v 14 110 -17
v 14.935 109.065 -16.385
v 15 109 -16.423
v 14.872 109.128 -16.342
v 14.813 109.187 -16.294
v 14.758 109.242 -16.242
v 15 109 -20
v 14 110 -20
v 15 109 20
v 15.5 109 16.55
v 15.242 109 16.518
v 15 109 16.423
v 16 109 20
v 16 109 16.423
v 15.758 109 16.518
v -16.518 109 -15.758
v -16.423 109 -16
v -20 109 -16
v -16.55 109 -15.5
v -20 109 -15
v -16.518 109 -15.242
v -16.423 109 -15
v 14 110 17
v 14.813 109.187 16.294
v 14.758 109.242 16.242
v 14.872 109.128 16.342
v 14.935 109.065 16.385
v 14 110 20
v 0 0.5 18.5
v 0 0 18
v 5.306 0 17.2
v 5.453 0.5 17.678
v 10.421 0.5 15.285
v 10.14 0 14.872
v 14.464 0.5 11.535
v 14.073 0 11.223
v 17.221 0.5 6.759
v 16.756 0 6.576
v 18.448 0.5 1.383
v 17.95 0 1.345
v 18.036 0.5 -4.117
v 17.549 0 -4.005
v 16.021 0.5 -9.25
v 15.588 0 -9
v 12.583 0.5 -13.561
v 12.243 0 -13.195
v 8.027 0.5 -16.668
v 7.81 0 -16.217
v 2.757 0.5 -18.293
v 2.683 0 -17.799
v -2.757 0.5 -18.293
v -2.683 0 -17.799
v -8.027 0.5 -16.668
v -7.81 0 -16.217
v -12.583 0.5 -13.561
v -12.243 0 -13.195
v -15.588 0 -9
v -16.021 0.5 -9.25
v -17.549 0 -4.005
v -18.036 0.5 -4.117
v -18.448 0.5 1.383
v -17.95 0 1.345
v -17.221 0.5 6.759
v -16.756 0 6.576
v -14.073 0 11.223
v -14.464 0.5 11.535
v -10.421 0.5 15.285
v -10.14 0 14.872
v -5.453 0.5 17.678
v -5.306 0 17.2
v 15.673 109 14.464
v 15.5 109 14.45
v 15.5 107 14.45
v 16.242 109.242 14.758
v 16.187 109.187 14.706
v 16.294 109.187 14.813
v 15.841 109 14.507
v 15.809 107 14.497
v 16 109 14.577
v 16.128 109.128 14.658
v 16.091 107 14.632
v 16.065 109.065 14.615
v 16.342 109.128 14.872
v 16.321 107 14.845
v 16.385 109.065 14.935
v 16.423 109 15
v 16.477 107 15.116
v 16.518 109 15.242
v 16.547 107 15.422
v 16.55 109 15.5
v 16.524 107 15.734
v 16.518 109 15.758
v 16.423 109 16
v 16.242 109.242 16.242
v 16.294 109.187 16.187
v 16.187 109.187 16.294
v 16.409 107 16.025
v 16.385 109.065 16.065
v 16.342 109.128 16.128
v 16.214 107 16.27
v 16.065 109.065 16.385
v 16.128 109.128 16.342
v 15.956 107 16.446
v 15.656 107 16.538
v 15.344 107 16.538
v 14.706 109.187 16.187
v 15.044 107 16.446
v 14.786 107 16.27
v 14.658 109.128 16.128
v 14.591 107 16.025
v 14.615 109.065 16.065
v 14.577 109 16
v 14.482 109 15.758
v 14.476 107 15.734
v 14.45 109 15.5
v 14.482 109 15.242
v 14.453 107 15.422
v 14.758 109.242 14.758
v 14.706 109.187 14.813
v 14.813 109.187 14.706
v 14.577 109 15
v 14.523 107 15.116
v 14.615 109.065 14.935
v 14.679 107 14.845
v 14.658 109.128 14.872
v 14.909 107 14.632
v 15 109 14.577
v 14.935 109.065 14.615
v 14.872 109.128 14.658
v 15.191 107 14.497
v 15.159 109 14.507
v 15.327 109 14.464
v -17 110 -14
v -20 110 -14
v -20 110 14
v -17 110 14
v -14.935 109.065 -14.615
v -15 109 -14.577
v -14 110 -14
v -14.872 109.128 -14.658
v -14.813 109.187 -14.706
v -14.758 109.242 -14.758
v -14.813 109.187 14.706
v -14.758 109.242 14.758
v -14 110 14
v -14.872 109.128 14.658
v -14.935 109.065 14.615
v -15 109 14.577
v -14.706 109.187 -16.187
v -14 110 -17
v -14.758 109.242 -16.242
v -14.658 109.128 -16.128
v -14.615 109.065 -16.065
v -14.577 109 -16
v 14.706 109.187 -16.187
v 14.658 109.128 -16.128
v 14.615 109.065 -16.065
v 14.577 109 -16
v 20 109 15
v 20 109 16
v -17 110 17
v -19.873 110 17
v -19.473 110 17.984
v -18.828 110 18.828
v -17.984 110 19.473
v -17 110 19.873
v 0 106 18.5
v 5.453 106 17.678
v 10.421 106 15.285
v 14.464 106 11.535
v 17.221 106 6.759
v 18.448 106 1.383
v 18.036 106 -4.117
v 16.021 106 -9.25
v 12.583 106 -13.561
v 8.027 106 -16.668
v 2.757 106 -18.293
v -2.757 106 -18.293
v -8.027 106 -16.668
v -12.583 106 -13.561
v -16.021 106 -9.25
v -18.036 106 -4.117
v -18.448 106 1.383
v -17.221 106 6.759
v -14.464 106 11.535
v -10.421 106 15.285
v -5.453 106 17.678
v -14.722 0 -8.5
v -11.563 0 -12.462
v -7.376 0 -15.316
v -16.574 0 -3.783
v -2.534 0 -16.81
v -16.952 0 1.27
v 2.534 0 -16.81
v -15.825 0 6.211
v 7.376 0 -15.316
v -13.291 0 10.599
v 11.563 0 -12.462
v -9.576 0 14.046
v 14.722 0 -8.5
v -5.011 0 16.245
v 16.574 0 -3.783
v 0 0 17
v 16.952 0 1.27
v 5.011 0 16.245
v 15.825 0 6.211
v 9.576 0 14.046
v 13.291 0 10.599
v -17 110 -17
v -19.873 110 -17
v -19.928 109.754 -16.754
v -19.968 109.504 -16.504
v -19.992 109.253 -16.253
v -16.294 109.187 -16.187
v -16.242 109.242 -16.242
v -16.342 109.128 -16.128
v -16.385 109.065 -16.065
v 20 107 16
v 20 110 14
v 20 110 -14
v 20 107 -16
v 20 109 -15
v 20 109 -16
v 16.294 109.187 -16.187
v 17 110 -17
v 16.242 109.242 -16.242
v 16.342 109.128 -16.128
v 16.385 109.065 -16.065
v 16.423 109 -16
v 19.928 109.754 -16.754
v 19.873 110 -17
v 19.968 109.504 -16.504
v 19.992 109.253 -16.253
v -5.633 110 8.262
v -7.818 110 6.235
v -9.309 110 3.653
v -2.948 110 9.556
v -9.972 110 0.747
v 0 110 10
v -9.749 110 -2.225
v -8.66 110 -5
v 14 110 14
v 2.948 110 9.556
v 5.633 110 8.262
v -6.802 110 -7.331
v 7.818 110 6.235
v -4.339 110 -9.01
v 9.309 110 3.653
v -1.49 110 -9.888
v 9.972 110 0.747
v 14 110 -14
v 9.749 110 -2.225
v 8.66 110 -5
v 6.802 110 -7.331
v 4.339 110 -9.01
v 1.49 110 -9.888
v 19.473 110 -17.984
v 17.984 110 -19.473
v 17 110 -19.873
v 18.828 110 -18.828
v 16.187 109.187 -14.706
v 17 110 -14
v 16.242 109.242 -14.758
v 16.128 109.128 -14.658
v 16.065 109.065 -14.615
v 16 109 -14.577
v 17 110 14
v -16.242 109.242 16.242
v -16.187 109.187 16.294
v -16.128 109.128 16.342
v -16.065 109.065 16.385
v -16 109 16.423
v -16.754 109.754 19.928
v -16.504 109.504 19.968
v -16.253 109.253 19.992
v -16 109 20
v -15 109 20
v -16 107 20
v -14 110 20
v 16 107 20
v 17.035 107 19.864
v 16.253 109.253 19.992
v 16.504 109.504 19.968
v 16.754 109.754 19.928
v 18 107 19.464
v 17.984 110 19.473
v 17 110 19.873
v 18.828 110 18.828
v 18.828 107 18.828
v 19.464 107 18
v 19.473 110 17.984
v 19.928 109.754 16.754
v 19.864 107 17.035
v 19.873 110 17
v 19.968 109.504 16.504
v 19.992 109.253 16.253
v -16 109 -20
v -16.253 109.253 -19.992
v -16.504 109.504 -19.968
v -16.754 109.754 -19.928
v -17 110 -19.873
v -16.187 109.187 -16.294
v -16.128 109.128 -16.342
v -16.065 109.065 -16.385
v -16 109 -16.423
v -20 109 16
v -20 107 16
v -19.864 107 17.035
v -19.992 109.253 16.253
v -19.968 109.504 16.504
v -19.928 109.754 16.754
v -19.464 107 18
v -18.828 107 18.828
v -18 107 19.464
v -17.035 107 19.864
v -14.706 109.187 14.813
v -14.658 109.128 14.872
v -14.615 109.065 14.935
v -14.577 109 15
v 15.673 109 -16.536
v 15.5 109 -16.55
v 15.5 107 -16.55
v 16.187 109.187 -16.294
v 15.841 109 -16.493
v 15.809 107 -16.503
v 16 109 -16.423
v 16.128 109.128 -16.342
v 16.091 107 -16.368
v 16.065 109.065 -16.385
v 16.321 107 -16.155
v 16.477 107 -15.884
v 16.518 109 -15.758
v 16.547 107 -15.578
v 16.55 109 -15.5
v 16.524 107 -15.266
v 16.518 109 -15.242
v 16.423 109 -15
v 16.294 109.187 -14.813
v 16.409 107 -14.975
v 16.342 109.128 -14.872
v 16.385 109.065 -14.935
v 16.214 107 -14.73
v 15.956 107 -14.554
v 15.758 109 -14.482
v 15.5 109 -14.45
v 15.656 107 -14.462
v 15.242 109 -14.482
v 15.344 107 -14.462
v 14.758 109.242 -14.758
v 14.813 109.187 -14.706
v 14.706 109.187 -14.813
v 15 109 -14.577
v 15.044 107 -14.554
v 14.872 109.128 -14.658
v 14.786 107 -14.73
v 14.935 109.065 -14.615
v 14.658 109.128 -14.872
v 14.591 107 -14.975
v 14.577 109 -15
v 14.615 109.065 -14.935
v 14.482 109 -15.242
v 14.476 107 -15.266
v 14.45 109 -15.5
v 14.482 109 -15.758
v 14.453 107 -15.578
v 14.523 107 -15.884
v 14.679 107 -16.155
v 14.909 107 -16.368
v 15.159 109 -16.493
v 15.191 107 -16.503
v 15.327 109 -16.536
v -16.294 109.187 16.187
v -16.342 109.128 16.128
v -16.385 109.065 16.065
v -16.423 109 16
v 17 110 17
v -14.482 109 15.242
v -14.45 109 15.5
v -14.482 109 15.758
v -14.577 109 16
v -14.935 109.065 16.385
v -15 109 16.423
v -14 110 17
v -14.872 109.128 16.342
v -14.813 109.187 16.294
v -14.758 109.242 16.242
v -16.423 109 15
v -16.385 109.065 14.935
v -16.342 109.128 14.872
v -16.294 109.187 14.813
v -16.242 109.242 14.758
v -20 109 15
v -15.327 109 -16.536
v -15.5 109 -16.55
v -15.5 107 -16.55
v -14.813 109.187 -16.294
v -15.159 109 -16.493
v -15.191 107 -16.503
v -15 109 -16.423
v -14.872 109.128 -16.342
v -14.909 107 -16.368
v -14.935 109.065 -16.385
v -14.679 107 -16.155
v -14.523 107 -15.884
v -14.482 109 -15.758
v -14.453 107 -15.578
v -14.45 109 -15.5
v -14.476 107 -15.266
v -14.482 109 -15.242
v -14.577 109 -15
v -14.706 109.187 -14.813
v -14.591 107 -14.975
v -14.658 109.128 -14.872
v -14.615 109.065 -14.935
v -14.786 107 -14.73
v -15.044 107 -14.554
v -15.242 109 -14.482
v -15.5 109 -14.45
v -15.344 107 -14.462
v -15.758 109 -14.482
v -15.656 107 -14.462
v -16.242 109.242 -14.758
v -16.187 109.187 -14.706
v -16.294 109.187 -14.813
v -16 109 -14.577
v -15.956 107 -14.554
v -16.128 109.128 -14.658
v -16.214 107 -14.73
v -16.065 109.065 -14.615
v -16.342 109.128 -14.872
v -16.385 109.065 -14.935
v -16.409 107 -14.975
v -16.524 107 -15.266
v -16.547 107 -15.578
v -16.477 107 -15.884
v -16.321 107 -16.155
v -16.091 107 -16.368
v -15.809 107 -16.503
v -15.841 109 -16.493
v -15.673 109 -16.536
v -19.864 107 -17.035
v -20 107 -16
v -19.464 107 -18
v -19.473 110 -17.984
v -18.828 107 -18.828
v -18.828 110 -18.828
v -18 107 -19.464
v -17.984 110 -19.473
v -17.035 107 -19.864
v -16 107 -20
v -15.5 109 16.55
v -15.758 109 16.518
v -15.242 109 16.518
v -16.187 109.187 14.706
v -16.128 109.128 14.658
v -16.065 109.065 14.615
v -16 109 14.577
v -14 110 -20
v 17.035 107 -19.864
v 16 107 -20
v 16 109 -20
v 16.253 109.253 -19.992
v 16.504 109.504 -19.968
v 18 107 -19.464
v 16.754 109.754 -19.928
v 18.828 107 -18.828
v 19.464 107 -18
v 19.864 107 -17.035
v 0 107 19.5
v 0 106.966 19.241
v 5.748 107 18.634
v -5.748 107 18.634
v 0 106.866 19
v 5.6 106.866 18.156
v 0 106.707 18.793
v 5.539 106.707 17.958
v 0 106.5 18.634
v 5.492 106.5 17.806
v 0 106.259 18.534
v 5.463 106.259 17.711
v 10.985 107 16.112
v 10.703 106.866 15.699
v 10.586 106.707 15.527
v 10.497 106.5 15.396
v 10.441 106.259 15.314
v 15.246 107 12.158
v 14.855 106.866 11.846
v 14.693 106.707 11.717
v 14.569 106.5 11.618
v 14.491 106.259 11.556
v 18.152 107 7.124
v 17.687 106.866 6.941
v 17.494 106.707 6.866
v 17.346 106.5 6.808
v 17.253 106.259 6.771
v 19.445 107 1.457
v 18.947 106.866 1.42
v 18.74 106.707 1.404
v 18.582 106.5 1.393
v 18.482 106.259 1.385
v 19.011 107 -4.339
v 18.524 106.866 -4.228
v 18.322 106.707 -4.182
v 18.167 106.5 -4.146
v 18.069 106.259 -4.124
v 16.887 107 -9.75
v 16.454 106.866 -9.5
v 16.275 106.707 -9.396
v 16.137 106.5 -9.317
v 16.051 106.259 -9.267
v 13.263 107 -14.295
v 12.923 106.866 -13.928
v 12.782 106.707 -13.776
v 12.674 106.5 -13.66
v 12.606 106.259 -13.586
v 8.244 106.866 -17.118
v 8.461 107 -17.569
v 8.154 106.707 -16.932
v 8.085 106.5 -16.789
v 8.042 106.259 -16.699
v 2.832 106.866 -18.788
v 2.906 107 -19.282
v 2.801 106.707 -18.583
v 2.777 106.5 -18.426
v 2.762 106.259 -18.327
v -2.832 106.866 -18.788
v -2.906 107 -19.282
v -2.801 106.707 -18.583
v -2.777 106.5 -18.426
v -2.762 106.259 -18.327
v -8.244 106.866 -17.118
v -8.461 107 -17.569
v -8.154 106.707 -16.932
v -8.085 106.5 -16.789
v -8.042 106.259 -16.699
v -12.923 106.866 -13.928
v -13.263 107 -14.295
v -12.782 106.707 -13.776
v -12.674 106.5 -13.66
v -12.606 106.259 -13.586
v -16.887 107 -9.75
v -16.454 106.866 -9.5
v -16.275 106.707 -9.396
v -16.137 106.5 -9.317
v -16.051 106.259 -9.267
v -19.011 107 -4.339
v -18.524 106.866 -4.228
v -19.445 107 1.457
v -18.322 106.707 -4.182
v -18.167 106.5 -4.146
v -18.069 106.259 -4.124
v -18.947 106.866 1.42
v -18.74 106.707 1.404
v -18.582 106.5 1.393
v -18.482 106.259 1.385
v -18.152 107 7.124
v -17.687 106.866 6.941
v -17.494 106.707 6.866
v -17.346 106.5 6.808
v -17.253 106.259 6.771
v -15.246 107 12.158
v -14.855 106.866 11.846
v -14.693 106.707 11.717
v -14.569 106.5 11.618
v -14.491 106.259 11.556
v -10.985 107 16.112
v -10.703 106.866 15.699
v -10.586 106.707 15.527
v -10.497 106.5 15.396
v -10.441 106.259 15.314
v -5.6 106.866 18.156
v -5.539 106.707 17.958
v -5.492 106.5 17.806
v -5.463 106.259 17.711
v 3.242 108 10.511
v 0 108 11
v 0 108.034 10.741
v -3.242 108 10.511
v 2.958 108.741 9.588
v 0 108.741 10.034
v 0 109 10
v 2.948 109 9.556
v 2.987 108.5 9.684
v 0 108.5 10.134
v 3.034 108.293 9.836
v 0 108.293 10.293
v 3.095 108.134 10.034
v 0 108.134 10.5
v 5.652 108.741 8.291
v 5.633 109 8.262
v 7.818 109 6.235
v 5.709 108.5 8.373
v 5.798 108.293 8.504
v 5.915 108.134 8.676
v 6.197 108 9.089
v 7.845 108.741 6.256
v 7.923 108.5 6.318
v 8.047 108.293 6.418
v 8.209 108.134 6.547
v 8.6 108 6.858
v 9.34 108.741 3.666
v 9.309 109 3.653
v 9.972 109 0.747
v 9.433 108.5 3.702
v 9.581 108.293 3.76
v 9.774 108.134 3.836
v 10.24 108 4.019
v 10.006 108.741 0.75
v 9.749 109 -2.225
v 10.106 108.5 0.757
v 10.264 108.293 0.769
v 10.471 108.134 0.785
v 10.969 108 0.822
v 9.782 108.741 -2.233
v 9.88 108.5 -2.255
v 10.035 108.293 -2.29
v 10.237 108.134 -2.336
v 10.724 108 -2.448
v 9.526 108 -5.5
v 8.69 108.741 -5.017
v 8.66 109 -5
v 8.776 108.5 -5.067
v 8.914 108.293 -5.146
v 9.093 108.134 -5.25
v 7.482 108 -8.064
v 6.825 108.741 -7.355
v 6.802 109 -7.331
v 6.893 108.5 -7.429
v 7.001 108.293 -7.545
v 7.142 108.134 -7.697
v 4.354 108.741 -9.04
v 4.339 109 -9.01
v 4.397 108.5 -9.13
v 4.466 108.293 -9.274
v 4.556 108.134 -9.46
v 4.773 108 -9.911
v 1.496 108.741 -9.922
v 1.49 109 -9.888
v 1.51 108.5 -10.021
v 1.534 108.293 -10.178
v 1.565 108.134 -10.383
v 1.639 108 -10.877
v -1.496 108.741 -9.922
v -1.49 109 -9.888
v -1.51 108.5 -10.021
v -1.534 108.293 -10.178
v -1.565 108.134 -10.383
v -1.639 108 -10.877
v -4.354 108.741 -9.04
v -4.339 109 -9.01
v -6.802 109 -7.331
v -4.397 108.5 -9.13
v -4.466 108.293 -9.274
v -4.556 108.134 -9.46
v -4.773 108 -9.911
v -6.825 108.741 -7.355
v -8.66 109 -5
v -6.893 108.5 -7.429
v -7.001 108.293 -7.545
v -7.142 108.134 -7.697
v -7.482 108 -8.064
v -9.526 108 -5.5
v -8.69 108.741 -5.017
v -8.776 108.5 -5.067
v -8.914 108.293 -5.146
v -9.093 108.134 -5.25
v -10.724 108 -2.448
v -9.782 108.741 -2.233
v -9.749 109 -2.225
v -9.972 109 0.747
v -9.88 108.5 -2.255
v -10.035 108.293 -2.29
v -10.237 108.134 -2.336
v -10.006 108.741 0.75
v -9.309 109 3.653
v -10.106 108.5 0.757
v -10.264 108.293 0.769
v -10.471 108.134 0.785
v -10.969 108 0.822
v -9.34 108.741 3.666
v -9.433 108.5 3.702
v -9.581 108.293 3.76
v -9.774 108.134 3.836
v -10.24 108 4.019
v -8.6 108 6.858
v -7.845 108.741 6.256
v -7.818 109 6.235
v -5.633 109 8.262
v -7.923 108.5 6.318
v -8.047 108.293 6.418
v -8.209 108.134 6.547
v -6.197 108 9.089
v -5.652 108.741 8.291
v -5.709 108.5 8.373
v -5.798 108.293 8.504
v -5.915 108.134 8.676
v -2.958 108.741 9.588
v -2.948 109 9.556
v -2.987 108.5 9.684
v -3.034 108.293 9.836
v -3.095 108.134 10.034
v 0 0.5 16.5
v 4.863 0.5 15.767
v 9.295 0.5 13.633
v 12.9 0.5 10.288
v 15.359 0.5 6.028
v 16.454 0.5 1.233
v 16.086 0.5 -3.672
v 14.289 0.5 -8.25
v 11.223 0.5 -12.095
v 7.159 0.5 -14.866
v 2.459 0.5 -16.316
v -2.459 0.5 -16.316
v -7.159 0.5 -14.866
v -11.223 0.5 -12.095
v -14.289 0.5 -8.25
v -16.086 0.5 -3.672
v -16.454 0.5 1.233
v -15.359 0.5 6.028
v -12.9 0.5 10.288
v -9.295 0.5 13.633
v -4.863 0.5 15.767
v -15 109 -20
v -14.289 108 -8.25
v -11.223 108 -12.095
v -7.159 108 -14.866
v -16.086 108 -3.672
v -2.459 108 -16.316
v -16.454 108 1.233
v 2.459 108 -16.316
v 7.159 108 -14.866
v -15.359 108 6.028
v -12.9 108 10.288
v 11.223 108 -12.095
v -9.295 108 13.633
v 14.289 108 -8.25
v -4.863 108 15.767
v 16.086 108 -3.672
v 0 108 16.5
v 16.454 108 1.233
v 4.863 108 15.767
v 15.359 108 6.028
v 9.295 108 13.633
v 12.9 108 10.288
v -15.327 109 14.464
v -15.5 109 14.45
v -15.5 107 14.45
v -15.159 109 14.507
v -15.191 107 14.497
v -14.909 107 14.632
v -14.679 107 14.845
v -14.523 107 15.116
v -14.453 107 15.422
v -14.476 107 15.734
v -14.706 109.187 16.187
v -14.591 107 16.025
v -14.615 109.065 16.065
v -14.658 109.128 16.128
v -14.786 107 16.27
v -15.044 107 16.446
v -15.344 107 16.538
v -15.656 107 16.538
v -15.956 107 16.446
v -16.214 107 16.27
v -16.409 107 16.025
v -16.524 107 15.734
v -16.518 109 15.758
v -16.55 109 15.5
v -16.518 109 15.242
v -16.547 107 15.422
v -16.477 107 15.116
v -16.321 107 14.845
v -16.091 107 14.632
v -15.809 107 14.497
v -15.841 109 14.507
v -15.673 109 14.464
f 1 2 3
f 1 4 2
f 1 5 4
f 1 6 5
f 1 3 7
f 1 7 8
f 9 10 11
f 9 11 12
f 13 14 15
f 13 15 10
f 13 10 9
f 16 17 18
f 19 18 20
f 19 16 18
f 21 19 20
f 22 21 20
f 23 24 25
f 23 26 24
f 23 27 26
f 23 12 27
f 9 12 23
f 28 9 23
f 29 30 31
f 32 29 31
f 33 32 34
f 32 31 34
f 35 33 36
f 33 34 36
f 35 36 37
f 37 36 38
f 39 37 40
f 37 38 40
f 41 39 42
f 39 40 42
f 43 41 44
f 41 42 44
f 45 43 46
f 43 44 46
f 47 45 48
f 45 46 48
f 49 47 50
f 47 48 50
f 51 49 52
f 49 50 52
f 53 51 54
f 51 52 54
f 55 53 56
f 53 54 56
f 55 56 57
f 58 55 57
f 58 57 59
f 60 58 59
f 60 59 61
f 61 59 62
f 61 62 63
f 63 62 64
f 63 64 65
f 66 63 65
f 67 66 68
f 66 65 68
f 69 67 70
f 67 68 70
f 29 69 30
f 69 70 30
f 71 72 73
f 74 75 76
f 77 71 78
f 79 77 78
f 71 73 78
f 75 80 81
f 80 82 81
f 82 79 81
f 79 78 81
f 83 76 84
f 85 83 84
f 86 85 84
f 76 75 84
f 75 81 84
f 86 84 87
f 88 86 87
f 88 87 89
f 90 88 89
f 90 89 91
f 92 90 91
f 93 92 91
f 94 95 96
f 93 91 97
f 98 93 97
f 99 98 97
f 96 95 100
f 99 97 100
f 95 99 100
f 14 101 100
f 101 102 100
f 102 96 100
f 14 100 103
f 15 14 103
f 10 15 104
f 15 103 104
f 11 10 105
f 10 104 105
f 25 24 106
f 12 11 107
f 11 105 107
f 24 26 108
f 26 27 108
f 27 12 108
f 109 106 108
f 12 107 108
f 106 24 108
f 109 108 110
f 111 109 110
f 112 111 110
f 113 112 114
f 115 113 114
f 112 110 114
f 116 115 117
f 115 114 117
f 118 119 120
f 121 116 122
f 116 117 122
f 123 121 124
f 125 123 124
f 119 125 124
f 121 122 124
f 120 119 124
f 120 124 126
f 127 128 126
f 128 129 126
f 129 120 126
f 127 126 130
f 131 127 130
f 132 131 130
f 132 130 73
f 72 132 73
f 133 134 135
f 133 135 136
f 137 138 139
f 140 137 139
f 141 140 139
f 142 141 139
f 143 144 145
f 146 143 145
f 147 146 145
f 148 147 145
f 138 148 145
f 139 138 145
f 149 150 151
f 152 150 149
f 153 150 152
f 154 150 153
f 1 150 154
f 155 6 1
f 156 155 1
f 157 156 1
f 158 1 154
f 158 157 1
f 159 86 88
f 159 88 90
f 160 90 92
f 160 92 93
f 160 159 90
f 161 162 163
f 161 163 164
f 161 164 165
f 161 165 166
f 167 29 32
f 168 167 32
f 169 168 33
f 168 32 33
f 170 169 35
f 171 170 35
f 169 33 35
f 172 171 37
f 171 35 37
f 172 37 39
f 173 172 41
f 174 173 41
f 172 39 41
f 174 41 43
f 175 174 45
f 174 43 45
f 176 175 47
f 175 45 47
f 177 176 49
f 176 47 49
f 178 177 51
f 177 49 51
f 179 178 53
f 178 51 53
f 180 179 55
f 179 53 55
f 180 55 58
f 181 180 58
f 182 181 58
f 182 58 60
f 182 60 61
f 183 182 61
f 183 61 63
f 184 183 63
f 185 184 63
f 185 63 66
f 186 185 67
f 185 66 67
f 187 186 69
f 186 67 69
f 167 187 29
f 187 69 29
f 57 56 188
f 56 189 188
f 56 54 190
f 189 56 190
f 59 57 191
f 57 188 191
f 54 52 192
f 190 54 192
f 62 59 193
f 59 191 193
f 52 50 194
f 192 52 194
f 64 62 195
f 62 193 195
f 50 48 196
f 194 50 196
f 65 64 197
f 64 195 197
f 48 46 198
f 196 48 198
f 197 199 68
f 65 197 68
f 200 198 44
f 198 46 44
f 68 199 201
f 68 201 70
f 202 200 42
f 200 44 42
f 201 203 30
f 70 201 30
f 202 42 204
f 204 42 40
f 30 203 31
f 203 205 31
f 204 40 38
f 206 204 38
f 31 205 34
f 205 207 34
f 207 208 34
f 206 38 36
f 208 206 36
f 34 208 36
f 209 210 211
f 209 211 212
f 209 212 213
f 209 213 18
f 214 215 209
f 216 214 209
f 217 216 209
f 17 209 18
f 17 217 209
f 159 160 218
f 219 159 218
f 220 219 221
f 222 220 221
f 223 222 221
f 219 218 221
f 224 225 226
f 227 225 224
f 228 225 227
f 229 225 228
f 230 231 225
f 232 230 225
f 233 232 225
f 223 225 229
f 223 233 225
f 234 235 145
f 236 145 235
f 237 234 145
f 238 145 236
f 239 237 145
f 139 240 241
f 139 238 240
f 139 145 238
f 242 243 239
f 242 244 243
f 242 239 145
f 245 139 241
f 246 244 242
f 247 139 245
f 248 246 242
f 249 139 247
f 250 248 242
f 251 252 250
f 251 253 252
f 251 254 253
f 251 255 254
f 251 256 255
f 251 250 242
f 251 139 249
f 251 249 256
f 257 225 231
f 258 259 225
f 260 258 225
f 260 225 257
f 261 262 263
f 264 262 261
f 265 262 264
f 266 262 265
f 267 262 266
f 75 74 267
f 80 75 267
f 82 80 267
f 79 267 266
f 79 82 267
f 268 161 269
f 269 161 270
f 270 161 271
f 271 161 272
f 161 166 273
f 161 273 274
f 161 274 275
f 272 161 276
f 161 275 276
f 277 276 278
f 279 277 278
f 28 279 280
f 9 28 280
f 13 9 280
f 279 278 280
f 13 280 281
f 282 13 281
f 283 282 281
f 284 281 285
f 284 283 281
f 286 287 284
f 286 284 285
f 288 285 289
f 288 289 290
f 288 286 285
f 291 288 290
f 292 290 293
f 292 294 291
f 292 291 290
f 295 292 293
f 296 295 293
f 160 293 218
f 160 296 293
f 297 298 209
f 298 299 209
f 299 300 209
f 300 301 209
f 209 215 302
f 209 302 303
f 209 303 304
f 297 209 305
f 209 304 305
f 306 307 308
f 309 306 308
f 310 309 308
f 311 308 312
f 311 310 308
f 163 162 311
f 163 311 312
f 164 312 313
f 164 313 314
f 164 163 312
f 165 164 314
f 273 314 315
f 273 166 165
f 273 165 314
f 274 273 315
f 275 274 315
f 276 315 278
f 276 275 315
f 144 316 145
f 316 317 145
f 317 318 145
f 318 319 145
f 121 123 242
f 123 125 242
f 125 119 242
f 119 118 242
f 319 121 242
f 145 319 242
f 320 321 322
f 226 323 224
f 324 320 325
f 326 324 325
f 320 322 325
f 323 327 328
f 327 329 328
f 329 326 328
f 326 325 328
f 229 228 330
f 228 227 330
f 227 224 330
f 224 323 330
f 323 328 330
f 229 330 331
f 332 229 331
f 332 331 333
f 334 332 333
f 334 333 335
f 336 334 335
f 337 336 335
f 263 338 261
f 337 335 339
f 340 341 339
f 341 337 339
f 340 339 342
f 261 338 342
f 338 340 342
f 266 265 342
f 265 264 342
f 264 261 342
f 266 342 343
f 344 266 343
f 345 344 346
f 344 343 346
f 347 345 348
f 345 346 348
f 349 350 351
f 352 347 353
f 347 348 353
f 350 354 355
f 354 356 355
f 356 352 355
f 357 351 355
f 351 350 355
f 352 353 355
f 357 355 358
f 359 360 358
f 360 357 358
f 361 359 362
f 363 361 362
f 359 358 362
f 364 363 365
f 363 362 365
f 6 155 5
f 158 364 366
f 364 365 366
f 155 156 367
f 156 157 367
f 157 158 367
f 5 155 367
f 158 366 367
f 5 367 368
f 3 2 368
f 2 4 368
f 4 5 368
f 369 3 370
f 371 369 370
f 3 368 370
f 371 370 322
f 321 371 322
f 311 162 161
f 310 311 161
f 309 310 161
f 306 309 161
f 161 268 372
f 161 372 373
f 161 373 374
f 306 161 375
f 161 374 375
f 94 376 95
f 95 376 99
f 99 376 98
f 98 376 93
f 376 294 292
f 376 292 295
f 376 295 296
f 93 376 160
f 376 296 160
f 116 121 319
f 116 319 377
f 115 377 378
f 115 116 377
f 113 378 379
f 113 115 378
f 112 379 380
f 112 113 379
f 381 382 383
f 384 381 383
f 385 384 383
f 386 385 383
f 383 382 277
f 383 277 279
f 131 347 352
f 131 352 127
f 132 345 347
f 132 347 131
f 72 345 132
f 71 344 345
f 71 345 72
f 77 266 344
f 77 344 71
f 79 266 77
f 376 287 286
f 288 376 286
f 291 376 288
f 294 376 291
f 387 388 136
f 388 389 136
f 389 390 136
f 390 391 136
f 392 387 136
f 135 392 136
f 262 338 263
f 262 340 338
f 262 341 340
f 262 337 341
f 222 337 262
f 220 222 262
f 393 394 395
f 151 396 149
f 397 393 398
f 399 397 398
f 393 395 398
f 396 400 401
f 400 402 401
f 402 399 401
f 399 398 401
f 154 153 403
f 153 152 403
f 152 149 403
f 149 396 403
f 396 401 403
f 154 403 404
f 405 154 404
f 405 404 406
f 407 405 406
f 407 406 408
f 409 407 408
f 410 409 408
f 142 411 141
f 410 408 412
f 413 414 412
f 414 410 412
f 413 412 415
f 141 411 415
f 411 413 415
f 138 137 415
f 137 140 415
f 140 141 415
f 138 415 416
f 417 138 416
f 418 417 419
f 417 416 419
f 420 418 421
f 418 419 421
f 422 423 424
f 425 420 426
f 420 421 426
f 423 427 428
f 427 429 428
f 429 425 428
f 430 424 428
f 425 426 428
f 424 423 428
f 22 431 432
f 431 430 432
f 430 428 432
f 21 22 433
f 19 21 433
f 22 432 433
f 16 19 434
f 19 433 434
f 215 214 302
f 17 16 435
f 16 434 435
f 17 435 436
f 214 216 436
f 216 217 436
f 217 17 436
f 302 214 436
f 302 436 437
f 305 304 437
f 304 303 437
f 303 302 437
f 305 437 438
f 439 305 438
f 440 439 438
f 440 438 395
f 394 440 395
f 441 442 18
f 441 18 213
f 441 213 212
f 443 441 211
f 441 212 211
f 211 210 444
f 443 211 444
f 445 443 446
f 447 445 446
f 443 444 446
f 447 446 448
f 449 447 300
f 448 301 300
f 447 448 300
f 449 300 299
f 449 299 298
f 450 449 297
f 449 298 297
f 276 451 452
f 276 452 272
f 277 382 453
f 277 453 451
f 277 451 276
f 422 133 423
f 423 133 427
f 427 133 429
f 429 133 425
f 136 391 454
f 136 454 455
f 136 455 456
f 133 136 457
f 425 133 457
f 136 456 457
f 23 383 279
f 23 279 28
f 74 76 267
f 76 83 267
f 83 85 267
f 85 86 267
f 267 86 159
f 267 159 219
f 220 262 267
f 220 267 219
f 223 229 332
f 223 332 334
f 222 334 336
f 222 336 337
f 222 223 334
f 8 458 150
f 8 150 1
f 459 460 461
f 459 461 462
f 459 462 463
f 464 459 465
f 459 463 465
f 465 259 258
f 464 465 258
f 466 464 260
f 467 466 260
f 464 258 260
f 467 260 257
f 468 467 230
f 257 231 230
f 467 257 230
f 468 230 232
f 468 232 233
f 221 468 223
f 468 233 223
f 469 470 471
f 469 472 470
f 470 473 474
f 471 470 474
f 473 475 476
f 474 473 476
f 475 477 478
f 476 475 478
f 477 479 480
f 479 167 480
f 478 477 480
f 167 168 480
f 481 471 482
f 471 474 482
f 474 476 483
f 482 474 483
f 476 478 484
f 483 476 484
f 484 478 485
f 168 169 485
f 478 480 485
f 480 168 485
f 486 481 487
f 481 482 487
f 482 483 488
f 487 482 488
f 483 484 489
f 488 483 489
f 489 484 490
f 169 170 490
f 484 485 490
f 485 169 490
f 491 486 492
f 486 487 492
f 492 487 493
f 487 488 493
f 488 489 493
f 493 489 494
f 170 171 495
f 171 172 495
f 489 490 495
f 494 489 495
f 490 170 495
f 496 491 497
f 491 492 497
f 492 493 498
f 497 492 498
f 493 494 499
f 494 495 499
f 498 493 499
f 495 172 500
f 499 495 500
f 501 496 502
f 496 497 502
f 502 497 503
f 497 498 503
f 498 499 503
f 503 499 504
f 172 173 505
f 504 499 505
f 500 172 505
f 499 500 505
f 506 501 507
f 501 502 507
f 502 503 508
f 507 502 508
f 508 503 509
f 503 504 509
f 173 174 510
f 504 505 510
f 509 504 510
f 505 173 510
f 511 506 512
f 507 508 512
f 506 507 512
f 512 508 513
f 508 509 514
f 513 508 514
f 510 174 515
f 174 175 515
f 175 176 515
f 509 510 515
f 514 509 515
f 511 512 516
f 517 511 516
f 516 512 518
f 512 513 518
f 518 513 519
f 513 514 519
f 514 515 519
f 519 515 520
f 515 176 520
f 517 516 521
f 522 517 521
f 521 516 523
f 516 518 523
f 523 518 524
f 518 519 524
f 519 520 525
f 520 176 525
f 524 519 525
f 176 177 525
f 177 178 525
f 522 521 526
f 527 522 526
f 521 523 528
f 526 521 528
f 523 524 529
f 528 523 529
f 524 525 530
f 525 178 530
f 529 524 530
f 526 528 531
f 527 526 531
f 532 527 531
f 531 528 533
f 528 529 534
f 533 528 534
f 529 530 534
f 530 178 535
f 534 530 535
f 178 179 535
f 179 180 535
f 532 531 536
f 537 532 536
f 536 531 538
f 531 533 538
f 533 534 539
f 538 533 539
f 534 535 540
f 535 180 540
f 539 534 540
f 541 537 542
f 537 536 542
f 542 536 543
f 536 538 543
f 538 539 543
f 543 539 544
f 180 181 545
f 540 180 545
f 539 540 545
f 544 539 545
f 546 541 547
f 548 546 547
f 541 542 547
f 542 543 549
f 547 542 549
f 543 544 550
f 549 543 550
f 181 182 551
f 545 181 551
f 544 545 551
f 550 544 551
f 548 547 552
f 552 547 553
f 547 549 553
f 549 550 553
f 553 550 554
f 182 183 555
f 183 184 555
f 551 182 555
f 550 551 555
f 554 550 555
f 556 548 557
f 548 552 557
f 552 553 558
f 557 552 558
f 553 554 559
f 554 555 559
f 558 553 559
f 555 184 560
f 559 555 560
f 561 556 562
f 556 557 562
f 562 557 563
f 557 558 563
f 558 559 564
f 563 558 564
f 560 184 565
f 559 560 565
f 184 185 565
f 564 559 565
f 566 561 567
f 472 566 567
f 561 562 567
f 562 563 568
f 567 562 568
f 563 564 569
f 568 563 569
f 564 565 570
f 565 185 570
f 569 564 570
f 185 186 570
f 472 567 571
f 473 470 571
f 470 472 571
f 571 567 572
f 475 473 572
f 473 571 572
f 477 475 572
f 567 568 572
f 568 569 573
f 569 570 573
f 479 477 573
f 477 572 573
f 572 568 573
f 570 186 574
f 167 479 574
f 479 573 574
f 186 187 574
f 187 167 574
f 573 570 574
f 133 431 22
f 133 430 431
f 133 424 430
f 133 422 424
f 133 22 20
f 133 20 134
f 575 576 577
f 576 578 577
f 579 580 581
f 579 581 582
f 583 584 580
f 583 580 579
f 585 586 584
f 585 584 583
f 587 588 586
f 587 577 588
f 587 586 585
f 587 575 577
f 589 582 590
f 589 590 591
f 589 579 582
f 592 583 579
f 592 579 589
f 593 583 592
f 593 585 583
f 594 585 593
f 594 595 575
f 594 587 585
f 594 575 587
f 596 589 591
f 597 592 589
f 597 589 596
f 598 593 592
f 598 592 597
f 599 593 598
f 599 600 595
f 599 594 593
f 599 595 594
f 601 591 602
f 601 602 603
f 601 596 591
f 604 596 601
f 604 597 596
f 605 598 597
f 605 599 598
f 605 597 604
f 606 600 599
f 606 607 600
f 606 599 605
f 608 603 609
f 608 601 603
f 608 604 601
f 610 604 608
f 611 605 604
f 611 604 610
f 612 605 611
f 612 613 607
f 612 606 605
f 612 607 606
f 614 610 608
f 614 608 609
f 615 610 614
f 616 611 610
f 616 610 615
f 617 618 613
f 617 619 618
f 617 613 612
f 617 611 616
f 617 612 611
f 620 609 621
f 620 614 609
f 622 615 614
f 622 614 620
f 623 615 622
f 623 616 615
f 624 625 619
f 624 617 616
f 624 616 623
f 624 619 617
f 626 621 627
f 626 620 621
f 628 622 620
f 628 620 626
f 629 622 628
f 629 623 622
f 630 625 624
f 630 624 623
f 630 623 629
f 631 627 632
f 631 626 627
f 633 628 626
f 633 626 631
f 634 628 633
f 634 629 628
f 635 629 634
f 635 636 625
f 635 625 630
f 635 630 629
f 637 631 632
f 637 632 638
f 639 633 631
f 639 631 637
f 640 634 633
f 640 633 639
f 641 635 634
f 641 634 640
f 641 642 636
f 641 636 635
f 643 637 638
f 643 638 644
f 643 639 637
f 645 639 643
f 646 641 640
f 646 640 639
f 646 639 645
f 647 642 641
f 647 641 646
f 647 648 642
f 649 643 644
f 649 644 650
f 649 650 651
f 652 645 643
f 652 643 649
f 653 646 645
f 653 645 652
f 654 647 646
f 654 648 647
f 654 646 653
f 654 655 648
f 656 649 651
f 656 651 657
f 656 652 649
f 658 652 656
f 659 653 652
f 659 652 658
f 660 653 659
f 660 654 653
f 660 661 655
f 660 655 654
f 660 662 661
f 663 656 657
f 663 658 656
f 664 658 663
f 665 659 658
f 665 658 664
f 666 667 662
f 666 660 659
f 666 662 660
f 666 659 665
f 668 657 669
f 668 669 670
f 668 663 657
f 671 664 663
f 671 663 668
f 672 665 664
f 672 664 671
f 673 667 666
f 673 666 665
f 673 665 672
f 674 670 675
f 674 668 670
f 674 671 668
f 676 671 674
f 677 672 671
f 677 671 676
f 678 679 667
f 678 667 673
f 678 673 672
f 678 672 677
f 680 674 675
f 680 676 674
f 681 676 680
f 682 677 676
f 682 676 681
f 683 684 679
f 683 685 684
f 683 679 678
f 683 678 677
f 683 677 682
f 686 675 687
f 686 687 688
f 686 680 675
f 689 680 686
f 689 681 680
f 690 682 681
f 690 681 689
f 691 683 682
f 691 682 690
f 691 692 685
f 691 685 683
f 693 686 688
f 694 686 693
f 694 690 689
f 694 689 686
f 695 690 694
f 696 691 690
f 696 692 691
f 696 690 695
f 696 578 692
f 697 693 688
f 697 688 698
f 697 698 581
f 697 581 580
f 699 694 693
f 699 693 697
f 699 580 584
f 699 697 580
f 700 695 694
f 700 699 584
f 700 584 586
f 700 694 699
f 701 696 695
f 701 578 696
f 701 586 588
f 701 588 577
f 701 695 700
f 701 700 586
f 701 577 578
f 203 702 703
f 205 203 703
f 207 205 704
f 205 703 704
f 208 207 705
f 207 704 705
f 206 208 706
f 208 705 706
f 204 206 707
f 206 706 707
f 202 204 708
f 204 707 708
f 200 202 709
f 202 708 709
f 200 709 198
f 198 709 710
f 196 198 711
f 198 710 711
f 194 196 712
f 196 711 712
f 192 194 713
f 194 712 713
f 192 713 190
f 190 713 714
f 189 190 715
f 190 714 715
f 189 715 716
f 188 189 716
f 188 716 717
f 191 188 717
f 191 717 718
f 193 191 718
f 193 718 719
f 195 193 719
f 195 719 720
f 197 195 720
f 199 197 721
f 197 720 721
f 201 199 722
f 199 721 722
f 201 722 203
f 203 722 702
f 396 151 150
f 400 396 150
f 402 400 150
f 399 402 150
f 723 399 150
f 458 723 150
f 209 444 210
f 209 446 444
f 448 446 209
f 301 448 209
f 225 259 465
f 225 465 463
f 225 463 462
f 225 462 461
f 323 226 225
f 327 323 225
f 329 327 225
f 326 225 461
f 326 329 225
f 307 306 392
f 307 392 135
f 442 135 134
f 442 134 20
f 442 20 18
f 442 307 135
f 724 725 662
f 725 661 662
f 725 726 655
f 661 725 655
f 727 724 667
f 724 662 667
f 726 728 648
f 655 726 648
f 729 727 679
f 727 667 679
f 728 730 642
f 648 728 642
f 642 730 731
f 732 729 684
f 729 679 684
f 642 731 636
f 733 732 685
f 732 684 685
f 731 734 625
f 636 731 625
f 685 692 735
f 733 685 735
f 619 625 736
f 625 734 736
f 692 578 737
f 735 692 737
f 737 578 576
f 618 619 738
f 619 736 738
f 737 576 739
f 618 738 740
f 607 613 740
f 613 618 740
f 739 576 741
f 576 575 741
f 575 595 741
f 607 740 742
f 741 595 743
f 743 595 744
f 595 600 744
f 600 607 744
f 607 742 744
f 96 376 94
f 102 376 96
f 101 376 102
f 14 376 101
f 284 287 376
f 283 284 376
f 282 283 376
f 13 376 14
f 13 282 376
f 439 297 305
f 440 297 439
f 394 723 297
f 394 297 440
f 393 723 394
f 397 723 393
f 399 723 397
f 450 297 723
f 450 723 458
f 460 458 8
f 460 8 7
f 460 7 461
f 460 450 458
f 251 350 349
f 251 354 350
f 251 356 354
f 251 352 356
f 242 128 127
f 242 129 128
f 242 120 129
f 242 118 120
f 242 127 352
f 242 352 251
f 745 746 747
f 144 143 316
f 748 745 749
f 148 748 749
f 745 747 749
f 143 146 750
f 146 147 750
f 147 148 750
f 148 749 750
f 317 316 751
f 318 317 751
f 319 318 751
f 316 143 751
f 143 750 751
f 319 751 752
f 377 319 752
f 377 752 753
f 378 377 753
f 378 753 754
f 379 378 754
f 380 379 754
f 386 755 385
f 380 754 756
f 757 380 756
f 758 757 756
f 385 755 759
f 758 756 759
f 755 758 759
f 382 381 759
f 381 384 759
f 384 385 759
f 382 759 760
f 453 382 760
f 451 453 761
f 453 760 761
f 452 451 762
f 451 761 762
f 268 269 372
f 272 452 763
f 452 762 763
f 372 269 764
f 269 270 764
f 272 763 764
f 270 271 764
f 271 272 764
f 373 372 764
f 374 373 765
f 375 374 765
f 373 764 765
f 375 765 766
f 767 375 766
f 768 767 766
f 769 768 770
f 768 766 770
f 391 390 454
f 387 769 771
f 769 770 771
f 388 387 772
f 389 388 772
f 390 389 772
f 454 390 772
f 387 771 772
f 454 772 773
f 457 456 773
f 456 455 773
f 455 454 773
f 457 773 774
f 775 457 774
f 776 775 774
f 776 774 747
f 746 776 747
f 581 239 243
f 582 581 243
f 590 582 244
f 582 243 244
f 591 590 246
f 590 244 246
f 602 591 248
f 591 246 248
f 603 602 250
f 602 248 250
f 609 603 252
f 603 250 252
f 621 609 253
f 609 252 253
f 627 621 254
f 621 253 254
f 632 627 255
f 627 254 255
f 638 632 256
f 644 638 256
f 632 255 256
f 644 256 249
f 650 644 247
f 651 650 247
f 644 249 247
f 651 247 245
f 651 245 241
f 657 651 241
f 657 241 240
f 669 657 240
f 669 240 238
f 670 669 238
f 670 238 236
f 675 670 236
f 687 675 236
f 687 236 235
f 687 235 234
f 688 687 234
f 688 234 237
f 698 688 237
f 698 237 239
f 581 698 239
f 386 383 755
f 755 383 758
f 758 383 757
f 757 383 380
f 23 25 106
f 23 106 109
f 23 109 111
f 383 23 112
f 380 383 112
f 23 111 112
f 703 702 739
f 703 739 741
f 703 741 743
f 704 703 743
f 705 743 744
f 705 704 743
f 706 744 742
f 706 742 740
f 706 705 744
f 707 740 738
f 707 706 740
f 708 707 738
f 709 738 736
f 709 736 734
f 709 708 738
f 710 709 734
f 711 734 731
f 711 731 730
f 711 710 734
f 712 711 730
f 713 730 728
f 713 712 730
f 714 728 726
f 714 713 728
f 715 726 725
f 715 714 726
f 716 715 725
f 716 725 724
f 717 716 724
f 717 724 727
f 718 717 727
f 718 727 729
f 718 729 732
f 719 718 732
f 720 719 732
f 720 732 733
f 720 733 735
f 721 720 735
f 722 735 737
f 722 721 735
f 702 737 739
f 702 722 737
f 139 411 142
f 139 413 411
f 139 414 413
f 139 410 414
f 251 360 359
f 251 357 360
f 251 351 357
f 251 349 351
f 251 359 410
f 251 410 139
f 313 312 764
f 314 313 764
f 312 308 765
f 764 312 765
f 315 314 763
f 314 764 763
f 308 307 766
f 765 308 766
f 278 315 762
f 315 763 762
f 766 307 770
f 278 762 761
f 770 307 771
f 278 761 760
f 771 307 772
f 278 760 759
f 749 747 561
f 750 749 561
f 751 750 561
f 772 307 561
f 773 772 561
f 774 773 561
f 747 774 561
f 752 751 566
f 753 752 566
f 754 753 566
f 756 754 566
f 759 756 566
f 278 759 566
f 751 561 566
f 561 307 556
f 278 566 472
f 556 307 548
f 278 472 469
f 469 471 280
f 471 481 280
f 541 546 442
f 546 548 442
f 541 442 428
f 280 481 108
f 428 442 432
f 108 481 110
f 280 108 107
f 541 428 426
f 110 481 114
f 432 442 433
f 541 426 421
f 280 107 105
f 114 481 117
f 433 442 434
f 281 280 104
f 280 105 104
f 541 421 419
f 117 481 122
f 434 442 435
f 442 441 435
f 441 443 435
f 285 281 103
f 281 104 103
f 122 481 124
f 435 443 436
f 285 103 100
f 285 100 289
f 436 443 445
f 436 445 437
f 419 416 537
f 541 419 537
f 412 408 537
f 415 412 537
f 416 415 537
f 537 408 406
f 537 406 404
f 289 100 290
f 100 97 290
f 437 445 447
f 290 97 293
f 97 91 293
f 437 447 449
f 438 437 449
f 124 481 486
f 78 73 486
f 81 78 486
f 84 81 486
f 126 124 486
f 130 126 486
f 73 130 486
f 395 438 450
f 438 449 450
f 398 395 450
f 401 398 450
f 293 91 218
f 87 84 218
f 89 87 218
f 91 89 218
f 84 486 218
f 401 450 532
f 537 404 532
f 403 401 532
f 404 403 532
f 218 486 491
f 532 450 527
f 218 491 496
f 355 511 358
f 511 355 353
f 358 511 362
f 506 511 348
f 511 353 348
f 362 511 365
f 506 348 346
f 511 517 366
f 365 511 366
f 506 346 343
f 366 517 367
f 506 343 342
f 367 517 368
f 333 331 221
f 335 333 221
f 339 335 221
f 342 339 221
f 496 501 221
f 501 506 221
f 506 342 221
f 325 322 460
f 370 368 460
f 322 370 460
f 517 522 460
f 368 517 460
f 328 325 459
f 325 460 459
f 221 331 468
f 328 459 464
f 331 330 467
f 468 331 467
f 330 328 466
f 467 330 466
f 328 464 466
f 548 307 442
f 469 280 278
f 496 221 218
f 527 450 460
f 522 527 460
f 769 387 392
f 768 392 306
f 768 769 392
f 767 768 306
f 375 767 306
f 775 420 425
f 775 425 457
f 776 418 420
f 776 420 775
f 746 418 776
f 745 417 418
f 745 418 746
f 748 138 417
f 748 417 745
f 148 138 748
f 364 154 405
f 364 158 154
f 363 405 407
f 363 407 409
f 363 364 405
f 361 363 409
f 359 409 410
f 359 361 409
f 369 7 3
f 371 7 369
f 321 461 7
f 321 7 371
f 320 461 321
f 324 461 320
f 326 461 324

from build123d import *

# Parameters (mm, degrees)
SKETCH1_R                = 18.5
SKETCH1_R_2              = 16.5
BOSS_EXTRUDE1_DEPTH      = 108
SKETCH2_R                = 18.5
BOSS_EXTRUDE2_DEPTH      = 2
SKETCH3_R                = 10
CUT_EXTRUDE1_DEPTH       = 114.06856327
BOSS_EXTRUDE3_START      = -3
SKETCH4_W                = 40
SKETCH4_H                = 40
SKETCH4_R                = 18.5
BOSS_EXTRUDE3_DEPTH      = 3
FILLET1_R                = 4
CUT_EXTRUDE2_DEPTH       = 119.74342087
CIRPATTERN1_COUNT        = 2
CIRPATTERN1_ANGLE        = 90
CIRPATTERN1_COPY_1_DEPTH = 119.74342087
SKETCH6_R                = 1.05
CUT_EXTRUDE3_DEPTH       = 111.675200474
FILLET2_R                = 1
CHAMFER1_SIZE            = 0.5


with BuildPart() as part:
    # Sketch1 → Boss-Extrude1 (new body)
    with BuildSketch(Plane(origin=(0, 0, 0), x_dir=(1, 0, 0), z_dir=(0, 1, 0))):
        with Locations(Location((0, 0, 0), (0, 0, 270))):
            Circle(SKETCH1_R)
        with Locations(Location((0, 0, 0), (0, 0, 270))):
            Circle(SKETCH1_R_2, mode=Mode.SUBTRACT)
    extrude(amount=BOSS_EXTRUDE1_DEPTH)

    # Sketch2 → Boss-Extrude2 (add)
    with BuildSketch(Plane(origin=(0, 108, 0), x_dir=(1, 0, 0), z_dir=(0, 1, 0))):
        with Locations(Location((0, 0, 0), (0, 0, 270))):
            Circle(SKETCH2_R)
    extrude(amount=BOSS_EXTRUDE2_DEPTH)

    # Sketch3 → Cut-Extrude1 (cut, through all)
    with BuildSketch(Plane(origin=(0, 110, 0), x_dir=(1, 0, 0), z_dir=(0, 1, 0))):
        with Locations(Location((0, 0, 0), (0, 0, 270))):
            Circle(SKETCH3_R)
    extrude(amount=-CUT_EXTRUDE1_DEPTH, mode=Mode.SUBTRACT)

    # Sketch4 → Boss-Extrude3 (add)
    with BuildSketch(Plane(origin=(0, 110, 0), x_dir=(1, 0, 0), z_dir=(0, 1, 0)).offset(BOSS_EXTRUDE3_START)):
        Rectangle(SKETCH4_W, SKETCH4_H)
        with Locations(Location((0, 0, 0), (0, 0, 270))):
            Circle(SKETCH4_R, mode=Mode.SUBTRACT)
    extrude(amount=BOSS_EXTRUDE3_DEPTH)

    # Fillet1
    fillet1_edges = [part.edges().sort_by_distance(p)[0] for p in [
        (-20, 108.5, 20),
        (-20, 108.5, -20),
        (20, 108.5, -20),
        (20, 108.5, 20),
    ]]
    fillet(fillet1_edges, radius=FILLET1_R)

    # Sketch5 → Cut-Extrude2 (cut, through all)
    with BuildSketch(Plane.XY.offset(20)):
        Polygon((14, 110), (17, 110), (16, 109), (15, 109), align=None)
    cut_extrude2 = extrude(amount=-CUT_EXTRUDE2_DEPTH, mode=Mode.SUBTRACT)

    # Mirror1: Cut-Extrude2 across plane
    add(cut_extrude2.mirror(Plane(origin=(0, 0, 0), x_dir=(0, 0, 1), z_dir=(1, 0, 0))), mode=Mode.SUBTRACT)

    # CirPattern1: Cut-Extrude2 ×2 about axis
    cirpattern1_axis = Axis((0, 0, 0), (0, 1, 0))
    for i in range(1, CIRPATTERN1_COUNT):
        add(cut_extrude2.rotate(cirpattern1_axis, i * CIRPATTERN1_ANGLE / (CIRPATTERN1_COUNT - 1)), mode=Mode.SUBTRACT)

    # CirPattern1 copy 1 sketch → CirPattern1 copy 1 (cut, through all)
    with BuildSketch(Plane(origin=(20, 0, 0), x_dir=(0, 0, 1), z_dir=(1, 0, 0))):
        Polygon((14, -110), (17, -110), (16, -109), (15, -109), align=None)
    extrude(amount=-CIRPATTERN1_COPY_1_DEPTH, mode=Mode.SUBTRACT)

    # Sketch6 → Cut-Extrude3 (cut, through all)
    with BuildSketch(Plane.XZ.offset(-107)):
        with Locations(Location((15.5, 15.5, 0), (0, 0, 270))):
            Circle(SKETCH6_R)
        with Locations(Location((-15.5, 15.5, 0), (0, 0, 270))):
            Circle(SKETCH6_R)
        with Locations(Location((-15.5, -15.5, 0), (0, 0, 270))):
            Circle(SKETCH6_R)
        with Locations(Location((15.5, -15.5, 0), (0, 0, 270))):
            Circle(SKETCH6_R)
    extrude(amount=-CUT_EXTRUDE3_DEPTH, mode=Mode.SUBTRACT)

    # Fillet2
    fillet2_edges = [part.edges().sort_by_distance(p)[0] for p in [
        (0, 108, -10),
        (0, 107, -18.5),
    ]]
    fillet(fillet2_edges, radius=FILLET2_R)

    # Chamfer1
    chamfer1_edges = [part.edges().sort_by_distance(p)[0] for p in [
        (0, 0, -18.5),
        (0, 0, -16.5),
    ]]
    chamfer(chamfer1_edges, length=CHAMFER1_SIZE)


solid = part.part
